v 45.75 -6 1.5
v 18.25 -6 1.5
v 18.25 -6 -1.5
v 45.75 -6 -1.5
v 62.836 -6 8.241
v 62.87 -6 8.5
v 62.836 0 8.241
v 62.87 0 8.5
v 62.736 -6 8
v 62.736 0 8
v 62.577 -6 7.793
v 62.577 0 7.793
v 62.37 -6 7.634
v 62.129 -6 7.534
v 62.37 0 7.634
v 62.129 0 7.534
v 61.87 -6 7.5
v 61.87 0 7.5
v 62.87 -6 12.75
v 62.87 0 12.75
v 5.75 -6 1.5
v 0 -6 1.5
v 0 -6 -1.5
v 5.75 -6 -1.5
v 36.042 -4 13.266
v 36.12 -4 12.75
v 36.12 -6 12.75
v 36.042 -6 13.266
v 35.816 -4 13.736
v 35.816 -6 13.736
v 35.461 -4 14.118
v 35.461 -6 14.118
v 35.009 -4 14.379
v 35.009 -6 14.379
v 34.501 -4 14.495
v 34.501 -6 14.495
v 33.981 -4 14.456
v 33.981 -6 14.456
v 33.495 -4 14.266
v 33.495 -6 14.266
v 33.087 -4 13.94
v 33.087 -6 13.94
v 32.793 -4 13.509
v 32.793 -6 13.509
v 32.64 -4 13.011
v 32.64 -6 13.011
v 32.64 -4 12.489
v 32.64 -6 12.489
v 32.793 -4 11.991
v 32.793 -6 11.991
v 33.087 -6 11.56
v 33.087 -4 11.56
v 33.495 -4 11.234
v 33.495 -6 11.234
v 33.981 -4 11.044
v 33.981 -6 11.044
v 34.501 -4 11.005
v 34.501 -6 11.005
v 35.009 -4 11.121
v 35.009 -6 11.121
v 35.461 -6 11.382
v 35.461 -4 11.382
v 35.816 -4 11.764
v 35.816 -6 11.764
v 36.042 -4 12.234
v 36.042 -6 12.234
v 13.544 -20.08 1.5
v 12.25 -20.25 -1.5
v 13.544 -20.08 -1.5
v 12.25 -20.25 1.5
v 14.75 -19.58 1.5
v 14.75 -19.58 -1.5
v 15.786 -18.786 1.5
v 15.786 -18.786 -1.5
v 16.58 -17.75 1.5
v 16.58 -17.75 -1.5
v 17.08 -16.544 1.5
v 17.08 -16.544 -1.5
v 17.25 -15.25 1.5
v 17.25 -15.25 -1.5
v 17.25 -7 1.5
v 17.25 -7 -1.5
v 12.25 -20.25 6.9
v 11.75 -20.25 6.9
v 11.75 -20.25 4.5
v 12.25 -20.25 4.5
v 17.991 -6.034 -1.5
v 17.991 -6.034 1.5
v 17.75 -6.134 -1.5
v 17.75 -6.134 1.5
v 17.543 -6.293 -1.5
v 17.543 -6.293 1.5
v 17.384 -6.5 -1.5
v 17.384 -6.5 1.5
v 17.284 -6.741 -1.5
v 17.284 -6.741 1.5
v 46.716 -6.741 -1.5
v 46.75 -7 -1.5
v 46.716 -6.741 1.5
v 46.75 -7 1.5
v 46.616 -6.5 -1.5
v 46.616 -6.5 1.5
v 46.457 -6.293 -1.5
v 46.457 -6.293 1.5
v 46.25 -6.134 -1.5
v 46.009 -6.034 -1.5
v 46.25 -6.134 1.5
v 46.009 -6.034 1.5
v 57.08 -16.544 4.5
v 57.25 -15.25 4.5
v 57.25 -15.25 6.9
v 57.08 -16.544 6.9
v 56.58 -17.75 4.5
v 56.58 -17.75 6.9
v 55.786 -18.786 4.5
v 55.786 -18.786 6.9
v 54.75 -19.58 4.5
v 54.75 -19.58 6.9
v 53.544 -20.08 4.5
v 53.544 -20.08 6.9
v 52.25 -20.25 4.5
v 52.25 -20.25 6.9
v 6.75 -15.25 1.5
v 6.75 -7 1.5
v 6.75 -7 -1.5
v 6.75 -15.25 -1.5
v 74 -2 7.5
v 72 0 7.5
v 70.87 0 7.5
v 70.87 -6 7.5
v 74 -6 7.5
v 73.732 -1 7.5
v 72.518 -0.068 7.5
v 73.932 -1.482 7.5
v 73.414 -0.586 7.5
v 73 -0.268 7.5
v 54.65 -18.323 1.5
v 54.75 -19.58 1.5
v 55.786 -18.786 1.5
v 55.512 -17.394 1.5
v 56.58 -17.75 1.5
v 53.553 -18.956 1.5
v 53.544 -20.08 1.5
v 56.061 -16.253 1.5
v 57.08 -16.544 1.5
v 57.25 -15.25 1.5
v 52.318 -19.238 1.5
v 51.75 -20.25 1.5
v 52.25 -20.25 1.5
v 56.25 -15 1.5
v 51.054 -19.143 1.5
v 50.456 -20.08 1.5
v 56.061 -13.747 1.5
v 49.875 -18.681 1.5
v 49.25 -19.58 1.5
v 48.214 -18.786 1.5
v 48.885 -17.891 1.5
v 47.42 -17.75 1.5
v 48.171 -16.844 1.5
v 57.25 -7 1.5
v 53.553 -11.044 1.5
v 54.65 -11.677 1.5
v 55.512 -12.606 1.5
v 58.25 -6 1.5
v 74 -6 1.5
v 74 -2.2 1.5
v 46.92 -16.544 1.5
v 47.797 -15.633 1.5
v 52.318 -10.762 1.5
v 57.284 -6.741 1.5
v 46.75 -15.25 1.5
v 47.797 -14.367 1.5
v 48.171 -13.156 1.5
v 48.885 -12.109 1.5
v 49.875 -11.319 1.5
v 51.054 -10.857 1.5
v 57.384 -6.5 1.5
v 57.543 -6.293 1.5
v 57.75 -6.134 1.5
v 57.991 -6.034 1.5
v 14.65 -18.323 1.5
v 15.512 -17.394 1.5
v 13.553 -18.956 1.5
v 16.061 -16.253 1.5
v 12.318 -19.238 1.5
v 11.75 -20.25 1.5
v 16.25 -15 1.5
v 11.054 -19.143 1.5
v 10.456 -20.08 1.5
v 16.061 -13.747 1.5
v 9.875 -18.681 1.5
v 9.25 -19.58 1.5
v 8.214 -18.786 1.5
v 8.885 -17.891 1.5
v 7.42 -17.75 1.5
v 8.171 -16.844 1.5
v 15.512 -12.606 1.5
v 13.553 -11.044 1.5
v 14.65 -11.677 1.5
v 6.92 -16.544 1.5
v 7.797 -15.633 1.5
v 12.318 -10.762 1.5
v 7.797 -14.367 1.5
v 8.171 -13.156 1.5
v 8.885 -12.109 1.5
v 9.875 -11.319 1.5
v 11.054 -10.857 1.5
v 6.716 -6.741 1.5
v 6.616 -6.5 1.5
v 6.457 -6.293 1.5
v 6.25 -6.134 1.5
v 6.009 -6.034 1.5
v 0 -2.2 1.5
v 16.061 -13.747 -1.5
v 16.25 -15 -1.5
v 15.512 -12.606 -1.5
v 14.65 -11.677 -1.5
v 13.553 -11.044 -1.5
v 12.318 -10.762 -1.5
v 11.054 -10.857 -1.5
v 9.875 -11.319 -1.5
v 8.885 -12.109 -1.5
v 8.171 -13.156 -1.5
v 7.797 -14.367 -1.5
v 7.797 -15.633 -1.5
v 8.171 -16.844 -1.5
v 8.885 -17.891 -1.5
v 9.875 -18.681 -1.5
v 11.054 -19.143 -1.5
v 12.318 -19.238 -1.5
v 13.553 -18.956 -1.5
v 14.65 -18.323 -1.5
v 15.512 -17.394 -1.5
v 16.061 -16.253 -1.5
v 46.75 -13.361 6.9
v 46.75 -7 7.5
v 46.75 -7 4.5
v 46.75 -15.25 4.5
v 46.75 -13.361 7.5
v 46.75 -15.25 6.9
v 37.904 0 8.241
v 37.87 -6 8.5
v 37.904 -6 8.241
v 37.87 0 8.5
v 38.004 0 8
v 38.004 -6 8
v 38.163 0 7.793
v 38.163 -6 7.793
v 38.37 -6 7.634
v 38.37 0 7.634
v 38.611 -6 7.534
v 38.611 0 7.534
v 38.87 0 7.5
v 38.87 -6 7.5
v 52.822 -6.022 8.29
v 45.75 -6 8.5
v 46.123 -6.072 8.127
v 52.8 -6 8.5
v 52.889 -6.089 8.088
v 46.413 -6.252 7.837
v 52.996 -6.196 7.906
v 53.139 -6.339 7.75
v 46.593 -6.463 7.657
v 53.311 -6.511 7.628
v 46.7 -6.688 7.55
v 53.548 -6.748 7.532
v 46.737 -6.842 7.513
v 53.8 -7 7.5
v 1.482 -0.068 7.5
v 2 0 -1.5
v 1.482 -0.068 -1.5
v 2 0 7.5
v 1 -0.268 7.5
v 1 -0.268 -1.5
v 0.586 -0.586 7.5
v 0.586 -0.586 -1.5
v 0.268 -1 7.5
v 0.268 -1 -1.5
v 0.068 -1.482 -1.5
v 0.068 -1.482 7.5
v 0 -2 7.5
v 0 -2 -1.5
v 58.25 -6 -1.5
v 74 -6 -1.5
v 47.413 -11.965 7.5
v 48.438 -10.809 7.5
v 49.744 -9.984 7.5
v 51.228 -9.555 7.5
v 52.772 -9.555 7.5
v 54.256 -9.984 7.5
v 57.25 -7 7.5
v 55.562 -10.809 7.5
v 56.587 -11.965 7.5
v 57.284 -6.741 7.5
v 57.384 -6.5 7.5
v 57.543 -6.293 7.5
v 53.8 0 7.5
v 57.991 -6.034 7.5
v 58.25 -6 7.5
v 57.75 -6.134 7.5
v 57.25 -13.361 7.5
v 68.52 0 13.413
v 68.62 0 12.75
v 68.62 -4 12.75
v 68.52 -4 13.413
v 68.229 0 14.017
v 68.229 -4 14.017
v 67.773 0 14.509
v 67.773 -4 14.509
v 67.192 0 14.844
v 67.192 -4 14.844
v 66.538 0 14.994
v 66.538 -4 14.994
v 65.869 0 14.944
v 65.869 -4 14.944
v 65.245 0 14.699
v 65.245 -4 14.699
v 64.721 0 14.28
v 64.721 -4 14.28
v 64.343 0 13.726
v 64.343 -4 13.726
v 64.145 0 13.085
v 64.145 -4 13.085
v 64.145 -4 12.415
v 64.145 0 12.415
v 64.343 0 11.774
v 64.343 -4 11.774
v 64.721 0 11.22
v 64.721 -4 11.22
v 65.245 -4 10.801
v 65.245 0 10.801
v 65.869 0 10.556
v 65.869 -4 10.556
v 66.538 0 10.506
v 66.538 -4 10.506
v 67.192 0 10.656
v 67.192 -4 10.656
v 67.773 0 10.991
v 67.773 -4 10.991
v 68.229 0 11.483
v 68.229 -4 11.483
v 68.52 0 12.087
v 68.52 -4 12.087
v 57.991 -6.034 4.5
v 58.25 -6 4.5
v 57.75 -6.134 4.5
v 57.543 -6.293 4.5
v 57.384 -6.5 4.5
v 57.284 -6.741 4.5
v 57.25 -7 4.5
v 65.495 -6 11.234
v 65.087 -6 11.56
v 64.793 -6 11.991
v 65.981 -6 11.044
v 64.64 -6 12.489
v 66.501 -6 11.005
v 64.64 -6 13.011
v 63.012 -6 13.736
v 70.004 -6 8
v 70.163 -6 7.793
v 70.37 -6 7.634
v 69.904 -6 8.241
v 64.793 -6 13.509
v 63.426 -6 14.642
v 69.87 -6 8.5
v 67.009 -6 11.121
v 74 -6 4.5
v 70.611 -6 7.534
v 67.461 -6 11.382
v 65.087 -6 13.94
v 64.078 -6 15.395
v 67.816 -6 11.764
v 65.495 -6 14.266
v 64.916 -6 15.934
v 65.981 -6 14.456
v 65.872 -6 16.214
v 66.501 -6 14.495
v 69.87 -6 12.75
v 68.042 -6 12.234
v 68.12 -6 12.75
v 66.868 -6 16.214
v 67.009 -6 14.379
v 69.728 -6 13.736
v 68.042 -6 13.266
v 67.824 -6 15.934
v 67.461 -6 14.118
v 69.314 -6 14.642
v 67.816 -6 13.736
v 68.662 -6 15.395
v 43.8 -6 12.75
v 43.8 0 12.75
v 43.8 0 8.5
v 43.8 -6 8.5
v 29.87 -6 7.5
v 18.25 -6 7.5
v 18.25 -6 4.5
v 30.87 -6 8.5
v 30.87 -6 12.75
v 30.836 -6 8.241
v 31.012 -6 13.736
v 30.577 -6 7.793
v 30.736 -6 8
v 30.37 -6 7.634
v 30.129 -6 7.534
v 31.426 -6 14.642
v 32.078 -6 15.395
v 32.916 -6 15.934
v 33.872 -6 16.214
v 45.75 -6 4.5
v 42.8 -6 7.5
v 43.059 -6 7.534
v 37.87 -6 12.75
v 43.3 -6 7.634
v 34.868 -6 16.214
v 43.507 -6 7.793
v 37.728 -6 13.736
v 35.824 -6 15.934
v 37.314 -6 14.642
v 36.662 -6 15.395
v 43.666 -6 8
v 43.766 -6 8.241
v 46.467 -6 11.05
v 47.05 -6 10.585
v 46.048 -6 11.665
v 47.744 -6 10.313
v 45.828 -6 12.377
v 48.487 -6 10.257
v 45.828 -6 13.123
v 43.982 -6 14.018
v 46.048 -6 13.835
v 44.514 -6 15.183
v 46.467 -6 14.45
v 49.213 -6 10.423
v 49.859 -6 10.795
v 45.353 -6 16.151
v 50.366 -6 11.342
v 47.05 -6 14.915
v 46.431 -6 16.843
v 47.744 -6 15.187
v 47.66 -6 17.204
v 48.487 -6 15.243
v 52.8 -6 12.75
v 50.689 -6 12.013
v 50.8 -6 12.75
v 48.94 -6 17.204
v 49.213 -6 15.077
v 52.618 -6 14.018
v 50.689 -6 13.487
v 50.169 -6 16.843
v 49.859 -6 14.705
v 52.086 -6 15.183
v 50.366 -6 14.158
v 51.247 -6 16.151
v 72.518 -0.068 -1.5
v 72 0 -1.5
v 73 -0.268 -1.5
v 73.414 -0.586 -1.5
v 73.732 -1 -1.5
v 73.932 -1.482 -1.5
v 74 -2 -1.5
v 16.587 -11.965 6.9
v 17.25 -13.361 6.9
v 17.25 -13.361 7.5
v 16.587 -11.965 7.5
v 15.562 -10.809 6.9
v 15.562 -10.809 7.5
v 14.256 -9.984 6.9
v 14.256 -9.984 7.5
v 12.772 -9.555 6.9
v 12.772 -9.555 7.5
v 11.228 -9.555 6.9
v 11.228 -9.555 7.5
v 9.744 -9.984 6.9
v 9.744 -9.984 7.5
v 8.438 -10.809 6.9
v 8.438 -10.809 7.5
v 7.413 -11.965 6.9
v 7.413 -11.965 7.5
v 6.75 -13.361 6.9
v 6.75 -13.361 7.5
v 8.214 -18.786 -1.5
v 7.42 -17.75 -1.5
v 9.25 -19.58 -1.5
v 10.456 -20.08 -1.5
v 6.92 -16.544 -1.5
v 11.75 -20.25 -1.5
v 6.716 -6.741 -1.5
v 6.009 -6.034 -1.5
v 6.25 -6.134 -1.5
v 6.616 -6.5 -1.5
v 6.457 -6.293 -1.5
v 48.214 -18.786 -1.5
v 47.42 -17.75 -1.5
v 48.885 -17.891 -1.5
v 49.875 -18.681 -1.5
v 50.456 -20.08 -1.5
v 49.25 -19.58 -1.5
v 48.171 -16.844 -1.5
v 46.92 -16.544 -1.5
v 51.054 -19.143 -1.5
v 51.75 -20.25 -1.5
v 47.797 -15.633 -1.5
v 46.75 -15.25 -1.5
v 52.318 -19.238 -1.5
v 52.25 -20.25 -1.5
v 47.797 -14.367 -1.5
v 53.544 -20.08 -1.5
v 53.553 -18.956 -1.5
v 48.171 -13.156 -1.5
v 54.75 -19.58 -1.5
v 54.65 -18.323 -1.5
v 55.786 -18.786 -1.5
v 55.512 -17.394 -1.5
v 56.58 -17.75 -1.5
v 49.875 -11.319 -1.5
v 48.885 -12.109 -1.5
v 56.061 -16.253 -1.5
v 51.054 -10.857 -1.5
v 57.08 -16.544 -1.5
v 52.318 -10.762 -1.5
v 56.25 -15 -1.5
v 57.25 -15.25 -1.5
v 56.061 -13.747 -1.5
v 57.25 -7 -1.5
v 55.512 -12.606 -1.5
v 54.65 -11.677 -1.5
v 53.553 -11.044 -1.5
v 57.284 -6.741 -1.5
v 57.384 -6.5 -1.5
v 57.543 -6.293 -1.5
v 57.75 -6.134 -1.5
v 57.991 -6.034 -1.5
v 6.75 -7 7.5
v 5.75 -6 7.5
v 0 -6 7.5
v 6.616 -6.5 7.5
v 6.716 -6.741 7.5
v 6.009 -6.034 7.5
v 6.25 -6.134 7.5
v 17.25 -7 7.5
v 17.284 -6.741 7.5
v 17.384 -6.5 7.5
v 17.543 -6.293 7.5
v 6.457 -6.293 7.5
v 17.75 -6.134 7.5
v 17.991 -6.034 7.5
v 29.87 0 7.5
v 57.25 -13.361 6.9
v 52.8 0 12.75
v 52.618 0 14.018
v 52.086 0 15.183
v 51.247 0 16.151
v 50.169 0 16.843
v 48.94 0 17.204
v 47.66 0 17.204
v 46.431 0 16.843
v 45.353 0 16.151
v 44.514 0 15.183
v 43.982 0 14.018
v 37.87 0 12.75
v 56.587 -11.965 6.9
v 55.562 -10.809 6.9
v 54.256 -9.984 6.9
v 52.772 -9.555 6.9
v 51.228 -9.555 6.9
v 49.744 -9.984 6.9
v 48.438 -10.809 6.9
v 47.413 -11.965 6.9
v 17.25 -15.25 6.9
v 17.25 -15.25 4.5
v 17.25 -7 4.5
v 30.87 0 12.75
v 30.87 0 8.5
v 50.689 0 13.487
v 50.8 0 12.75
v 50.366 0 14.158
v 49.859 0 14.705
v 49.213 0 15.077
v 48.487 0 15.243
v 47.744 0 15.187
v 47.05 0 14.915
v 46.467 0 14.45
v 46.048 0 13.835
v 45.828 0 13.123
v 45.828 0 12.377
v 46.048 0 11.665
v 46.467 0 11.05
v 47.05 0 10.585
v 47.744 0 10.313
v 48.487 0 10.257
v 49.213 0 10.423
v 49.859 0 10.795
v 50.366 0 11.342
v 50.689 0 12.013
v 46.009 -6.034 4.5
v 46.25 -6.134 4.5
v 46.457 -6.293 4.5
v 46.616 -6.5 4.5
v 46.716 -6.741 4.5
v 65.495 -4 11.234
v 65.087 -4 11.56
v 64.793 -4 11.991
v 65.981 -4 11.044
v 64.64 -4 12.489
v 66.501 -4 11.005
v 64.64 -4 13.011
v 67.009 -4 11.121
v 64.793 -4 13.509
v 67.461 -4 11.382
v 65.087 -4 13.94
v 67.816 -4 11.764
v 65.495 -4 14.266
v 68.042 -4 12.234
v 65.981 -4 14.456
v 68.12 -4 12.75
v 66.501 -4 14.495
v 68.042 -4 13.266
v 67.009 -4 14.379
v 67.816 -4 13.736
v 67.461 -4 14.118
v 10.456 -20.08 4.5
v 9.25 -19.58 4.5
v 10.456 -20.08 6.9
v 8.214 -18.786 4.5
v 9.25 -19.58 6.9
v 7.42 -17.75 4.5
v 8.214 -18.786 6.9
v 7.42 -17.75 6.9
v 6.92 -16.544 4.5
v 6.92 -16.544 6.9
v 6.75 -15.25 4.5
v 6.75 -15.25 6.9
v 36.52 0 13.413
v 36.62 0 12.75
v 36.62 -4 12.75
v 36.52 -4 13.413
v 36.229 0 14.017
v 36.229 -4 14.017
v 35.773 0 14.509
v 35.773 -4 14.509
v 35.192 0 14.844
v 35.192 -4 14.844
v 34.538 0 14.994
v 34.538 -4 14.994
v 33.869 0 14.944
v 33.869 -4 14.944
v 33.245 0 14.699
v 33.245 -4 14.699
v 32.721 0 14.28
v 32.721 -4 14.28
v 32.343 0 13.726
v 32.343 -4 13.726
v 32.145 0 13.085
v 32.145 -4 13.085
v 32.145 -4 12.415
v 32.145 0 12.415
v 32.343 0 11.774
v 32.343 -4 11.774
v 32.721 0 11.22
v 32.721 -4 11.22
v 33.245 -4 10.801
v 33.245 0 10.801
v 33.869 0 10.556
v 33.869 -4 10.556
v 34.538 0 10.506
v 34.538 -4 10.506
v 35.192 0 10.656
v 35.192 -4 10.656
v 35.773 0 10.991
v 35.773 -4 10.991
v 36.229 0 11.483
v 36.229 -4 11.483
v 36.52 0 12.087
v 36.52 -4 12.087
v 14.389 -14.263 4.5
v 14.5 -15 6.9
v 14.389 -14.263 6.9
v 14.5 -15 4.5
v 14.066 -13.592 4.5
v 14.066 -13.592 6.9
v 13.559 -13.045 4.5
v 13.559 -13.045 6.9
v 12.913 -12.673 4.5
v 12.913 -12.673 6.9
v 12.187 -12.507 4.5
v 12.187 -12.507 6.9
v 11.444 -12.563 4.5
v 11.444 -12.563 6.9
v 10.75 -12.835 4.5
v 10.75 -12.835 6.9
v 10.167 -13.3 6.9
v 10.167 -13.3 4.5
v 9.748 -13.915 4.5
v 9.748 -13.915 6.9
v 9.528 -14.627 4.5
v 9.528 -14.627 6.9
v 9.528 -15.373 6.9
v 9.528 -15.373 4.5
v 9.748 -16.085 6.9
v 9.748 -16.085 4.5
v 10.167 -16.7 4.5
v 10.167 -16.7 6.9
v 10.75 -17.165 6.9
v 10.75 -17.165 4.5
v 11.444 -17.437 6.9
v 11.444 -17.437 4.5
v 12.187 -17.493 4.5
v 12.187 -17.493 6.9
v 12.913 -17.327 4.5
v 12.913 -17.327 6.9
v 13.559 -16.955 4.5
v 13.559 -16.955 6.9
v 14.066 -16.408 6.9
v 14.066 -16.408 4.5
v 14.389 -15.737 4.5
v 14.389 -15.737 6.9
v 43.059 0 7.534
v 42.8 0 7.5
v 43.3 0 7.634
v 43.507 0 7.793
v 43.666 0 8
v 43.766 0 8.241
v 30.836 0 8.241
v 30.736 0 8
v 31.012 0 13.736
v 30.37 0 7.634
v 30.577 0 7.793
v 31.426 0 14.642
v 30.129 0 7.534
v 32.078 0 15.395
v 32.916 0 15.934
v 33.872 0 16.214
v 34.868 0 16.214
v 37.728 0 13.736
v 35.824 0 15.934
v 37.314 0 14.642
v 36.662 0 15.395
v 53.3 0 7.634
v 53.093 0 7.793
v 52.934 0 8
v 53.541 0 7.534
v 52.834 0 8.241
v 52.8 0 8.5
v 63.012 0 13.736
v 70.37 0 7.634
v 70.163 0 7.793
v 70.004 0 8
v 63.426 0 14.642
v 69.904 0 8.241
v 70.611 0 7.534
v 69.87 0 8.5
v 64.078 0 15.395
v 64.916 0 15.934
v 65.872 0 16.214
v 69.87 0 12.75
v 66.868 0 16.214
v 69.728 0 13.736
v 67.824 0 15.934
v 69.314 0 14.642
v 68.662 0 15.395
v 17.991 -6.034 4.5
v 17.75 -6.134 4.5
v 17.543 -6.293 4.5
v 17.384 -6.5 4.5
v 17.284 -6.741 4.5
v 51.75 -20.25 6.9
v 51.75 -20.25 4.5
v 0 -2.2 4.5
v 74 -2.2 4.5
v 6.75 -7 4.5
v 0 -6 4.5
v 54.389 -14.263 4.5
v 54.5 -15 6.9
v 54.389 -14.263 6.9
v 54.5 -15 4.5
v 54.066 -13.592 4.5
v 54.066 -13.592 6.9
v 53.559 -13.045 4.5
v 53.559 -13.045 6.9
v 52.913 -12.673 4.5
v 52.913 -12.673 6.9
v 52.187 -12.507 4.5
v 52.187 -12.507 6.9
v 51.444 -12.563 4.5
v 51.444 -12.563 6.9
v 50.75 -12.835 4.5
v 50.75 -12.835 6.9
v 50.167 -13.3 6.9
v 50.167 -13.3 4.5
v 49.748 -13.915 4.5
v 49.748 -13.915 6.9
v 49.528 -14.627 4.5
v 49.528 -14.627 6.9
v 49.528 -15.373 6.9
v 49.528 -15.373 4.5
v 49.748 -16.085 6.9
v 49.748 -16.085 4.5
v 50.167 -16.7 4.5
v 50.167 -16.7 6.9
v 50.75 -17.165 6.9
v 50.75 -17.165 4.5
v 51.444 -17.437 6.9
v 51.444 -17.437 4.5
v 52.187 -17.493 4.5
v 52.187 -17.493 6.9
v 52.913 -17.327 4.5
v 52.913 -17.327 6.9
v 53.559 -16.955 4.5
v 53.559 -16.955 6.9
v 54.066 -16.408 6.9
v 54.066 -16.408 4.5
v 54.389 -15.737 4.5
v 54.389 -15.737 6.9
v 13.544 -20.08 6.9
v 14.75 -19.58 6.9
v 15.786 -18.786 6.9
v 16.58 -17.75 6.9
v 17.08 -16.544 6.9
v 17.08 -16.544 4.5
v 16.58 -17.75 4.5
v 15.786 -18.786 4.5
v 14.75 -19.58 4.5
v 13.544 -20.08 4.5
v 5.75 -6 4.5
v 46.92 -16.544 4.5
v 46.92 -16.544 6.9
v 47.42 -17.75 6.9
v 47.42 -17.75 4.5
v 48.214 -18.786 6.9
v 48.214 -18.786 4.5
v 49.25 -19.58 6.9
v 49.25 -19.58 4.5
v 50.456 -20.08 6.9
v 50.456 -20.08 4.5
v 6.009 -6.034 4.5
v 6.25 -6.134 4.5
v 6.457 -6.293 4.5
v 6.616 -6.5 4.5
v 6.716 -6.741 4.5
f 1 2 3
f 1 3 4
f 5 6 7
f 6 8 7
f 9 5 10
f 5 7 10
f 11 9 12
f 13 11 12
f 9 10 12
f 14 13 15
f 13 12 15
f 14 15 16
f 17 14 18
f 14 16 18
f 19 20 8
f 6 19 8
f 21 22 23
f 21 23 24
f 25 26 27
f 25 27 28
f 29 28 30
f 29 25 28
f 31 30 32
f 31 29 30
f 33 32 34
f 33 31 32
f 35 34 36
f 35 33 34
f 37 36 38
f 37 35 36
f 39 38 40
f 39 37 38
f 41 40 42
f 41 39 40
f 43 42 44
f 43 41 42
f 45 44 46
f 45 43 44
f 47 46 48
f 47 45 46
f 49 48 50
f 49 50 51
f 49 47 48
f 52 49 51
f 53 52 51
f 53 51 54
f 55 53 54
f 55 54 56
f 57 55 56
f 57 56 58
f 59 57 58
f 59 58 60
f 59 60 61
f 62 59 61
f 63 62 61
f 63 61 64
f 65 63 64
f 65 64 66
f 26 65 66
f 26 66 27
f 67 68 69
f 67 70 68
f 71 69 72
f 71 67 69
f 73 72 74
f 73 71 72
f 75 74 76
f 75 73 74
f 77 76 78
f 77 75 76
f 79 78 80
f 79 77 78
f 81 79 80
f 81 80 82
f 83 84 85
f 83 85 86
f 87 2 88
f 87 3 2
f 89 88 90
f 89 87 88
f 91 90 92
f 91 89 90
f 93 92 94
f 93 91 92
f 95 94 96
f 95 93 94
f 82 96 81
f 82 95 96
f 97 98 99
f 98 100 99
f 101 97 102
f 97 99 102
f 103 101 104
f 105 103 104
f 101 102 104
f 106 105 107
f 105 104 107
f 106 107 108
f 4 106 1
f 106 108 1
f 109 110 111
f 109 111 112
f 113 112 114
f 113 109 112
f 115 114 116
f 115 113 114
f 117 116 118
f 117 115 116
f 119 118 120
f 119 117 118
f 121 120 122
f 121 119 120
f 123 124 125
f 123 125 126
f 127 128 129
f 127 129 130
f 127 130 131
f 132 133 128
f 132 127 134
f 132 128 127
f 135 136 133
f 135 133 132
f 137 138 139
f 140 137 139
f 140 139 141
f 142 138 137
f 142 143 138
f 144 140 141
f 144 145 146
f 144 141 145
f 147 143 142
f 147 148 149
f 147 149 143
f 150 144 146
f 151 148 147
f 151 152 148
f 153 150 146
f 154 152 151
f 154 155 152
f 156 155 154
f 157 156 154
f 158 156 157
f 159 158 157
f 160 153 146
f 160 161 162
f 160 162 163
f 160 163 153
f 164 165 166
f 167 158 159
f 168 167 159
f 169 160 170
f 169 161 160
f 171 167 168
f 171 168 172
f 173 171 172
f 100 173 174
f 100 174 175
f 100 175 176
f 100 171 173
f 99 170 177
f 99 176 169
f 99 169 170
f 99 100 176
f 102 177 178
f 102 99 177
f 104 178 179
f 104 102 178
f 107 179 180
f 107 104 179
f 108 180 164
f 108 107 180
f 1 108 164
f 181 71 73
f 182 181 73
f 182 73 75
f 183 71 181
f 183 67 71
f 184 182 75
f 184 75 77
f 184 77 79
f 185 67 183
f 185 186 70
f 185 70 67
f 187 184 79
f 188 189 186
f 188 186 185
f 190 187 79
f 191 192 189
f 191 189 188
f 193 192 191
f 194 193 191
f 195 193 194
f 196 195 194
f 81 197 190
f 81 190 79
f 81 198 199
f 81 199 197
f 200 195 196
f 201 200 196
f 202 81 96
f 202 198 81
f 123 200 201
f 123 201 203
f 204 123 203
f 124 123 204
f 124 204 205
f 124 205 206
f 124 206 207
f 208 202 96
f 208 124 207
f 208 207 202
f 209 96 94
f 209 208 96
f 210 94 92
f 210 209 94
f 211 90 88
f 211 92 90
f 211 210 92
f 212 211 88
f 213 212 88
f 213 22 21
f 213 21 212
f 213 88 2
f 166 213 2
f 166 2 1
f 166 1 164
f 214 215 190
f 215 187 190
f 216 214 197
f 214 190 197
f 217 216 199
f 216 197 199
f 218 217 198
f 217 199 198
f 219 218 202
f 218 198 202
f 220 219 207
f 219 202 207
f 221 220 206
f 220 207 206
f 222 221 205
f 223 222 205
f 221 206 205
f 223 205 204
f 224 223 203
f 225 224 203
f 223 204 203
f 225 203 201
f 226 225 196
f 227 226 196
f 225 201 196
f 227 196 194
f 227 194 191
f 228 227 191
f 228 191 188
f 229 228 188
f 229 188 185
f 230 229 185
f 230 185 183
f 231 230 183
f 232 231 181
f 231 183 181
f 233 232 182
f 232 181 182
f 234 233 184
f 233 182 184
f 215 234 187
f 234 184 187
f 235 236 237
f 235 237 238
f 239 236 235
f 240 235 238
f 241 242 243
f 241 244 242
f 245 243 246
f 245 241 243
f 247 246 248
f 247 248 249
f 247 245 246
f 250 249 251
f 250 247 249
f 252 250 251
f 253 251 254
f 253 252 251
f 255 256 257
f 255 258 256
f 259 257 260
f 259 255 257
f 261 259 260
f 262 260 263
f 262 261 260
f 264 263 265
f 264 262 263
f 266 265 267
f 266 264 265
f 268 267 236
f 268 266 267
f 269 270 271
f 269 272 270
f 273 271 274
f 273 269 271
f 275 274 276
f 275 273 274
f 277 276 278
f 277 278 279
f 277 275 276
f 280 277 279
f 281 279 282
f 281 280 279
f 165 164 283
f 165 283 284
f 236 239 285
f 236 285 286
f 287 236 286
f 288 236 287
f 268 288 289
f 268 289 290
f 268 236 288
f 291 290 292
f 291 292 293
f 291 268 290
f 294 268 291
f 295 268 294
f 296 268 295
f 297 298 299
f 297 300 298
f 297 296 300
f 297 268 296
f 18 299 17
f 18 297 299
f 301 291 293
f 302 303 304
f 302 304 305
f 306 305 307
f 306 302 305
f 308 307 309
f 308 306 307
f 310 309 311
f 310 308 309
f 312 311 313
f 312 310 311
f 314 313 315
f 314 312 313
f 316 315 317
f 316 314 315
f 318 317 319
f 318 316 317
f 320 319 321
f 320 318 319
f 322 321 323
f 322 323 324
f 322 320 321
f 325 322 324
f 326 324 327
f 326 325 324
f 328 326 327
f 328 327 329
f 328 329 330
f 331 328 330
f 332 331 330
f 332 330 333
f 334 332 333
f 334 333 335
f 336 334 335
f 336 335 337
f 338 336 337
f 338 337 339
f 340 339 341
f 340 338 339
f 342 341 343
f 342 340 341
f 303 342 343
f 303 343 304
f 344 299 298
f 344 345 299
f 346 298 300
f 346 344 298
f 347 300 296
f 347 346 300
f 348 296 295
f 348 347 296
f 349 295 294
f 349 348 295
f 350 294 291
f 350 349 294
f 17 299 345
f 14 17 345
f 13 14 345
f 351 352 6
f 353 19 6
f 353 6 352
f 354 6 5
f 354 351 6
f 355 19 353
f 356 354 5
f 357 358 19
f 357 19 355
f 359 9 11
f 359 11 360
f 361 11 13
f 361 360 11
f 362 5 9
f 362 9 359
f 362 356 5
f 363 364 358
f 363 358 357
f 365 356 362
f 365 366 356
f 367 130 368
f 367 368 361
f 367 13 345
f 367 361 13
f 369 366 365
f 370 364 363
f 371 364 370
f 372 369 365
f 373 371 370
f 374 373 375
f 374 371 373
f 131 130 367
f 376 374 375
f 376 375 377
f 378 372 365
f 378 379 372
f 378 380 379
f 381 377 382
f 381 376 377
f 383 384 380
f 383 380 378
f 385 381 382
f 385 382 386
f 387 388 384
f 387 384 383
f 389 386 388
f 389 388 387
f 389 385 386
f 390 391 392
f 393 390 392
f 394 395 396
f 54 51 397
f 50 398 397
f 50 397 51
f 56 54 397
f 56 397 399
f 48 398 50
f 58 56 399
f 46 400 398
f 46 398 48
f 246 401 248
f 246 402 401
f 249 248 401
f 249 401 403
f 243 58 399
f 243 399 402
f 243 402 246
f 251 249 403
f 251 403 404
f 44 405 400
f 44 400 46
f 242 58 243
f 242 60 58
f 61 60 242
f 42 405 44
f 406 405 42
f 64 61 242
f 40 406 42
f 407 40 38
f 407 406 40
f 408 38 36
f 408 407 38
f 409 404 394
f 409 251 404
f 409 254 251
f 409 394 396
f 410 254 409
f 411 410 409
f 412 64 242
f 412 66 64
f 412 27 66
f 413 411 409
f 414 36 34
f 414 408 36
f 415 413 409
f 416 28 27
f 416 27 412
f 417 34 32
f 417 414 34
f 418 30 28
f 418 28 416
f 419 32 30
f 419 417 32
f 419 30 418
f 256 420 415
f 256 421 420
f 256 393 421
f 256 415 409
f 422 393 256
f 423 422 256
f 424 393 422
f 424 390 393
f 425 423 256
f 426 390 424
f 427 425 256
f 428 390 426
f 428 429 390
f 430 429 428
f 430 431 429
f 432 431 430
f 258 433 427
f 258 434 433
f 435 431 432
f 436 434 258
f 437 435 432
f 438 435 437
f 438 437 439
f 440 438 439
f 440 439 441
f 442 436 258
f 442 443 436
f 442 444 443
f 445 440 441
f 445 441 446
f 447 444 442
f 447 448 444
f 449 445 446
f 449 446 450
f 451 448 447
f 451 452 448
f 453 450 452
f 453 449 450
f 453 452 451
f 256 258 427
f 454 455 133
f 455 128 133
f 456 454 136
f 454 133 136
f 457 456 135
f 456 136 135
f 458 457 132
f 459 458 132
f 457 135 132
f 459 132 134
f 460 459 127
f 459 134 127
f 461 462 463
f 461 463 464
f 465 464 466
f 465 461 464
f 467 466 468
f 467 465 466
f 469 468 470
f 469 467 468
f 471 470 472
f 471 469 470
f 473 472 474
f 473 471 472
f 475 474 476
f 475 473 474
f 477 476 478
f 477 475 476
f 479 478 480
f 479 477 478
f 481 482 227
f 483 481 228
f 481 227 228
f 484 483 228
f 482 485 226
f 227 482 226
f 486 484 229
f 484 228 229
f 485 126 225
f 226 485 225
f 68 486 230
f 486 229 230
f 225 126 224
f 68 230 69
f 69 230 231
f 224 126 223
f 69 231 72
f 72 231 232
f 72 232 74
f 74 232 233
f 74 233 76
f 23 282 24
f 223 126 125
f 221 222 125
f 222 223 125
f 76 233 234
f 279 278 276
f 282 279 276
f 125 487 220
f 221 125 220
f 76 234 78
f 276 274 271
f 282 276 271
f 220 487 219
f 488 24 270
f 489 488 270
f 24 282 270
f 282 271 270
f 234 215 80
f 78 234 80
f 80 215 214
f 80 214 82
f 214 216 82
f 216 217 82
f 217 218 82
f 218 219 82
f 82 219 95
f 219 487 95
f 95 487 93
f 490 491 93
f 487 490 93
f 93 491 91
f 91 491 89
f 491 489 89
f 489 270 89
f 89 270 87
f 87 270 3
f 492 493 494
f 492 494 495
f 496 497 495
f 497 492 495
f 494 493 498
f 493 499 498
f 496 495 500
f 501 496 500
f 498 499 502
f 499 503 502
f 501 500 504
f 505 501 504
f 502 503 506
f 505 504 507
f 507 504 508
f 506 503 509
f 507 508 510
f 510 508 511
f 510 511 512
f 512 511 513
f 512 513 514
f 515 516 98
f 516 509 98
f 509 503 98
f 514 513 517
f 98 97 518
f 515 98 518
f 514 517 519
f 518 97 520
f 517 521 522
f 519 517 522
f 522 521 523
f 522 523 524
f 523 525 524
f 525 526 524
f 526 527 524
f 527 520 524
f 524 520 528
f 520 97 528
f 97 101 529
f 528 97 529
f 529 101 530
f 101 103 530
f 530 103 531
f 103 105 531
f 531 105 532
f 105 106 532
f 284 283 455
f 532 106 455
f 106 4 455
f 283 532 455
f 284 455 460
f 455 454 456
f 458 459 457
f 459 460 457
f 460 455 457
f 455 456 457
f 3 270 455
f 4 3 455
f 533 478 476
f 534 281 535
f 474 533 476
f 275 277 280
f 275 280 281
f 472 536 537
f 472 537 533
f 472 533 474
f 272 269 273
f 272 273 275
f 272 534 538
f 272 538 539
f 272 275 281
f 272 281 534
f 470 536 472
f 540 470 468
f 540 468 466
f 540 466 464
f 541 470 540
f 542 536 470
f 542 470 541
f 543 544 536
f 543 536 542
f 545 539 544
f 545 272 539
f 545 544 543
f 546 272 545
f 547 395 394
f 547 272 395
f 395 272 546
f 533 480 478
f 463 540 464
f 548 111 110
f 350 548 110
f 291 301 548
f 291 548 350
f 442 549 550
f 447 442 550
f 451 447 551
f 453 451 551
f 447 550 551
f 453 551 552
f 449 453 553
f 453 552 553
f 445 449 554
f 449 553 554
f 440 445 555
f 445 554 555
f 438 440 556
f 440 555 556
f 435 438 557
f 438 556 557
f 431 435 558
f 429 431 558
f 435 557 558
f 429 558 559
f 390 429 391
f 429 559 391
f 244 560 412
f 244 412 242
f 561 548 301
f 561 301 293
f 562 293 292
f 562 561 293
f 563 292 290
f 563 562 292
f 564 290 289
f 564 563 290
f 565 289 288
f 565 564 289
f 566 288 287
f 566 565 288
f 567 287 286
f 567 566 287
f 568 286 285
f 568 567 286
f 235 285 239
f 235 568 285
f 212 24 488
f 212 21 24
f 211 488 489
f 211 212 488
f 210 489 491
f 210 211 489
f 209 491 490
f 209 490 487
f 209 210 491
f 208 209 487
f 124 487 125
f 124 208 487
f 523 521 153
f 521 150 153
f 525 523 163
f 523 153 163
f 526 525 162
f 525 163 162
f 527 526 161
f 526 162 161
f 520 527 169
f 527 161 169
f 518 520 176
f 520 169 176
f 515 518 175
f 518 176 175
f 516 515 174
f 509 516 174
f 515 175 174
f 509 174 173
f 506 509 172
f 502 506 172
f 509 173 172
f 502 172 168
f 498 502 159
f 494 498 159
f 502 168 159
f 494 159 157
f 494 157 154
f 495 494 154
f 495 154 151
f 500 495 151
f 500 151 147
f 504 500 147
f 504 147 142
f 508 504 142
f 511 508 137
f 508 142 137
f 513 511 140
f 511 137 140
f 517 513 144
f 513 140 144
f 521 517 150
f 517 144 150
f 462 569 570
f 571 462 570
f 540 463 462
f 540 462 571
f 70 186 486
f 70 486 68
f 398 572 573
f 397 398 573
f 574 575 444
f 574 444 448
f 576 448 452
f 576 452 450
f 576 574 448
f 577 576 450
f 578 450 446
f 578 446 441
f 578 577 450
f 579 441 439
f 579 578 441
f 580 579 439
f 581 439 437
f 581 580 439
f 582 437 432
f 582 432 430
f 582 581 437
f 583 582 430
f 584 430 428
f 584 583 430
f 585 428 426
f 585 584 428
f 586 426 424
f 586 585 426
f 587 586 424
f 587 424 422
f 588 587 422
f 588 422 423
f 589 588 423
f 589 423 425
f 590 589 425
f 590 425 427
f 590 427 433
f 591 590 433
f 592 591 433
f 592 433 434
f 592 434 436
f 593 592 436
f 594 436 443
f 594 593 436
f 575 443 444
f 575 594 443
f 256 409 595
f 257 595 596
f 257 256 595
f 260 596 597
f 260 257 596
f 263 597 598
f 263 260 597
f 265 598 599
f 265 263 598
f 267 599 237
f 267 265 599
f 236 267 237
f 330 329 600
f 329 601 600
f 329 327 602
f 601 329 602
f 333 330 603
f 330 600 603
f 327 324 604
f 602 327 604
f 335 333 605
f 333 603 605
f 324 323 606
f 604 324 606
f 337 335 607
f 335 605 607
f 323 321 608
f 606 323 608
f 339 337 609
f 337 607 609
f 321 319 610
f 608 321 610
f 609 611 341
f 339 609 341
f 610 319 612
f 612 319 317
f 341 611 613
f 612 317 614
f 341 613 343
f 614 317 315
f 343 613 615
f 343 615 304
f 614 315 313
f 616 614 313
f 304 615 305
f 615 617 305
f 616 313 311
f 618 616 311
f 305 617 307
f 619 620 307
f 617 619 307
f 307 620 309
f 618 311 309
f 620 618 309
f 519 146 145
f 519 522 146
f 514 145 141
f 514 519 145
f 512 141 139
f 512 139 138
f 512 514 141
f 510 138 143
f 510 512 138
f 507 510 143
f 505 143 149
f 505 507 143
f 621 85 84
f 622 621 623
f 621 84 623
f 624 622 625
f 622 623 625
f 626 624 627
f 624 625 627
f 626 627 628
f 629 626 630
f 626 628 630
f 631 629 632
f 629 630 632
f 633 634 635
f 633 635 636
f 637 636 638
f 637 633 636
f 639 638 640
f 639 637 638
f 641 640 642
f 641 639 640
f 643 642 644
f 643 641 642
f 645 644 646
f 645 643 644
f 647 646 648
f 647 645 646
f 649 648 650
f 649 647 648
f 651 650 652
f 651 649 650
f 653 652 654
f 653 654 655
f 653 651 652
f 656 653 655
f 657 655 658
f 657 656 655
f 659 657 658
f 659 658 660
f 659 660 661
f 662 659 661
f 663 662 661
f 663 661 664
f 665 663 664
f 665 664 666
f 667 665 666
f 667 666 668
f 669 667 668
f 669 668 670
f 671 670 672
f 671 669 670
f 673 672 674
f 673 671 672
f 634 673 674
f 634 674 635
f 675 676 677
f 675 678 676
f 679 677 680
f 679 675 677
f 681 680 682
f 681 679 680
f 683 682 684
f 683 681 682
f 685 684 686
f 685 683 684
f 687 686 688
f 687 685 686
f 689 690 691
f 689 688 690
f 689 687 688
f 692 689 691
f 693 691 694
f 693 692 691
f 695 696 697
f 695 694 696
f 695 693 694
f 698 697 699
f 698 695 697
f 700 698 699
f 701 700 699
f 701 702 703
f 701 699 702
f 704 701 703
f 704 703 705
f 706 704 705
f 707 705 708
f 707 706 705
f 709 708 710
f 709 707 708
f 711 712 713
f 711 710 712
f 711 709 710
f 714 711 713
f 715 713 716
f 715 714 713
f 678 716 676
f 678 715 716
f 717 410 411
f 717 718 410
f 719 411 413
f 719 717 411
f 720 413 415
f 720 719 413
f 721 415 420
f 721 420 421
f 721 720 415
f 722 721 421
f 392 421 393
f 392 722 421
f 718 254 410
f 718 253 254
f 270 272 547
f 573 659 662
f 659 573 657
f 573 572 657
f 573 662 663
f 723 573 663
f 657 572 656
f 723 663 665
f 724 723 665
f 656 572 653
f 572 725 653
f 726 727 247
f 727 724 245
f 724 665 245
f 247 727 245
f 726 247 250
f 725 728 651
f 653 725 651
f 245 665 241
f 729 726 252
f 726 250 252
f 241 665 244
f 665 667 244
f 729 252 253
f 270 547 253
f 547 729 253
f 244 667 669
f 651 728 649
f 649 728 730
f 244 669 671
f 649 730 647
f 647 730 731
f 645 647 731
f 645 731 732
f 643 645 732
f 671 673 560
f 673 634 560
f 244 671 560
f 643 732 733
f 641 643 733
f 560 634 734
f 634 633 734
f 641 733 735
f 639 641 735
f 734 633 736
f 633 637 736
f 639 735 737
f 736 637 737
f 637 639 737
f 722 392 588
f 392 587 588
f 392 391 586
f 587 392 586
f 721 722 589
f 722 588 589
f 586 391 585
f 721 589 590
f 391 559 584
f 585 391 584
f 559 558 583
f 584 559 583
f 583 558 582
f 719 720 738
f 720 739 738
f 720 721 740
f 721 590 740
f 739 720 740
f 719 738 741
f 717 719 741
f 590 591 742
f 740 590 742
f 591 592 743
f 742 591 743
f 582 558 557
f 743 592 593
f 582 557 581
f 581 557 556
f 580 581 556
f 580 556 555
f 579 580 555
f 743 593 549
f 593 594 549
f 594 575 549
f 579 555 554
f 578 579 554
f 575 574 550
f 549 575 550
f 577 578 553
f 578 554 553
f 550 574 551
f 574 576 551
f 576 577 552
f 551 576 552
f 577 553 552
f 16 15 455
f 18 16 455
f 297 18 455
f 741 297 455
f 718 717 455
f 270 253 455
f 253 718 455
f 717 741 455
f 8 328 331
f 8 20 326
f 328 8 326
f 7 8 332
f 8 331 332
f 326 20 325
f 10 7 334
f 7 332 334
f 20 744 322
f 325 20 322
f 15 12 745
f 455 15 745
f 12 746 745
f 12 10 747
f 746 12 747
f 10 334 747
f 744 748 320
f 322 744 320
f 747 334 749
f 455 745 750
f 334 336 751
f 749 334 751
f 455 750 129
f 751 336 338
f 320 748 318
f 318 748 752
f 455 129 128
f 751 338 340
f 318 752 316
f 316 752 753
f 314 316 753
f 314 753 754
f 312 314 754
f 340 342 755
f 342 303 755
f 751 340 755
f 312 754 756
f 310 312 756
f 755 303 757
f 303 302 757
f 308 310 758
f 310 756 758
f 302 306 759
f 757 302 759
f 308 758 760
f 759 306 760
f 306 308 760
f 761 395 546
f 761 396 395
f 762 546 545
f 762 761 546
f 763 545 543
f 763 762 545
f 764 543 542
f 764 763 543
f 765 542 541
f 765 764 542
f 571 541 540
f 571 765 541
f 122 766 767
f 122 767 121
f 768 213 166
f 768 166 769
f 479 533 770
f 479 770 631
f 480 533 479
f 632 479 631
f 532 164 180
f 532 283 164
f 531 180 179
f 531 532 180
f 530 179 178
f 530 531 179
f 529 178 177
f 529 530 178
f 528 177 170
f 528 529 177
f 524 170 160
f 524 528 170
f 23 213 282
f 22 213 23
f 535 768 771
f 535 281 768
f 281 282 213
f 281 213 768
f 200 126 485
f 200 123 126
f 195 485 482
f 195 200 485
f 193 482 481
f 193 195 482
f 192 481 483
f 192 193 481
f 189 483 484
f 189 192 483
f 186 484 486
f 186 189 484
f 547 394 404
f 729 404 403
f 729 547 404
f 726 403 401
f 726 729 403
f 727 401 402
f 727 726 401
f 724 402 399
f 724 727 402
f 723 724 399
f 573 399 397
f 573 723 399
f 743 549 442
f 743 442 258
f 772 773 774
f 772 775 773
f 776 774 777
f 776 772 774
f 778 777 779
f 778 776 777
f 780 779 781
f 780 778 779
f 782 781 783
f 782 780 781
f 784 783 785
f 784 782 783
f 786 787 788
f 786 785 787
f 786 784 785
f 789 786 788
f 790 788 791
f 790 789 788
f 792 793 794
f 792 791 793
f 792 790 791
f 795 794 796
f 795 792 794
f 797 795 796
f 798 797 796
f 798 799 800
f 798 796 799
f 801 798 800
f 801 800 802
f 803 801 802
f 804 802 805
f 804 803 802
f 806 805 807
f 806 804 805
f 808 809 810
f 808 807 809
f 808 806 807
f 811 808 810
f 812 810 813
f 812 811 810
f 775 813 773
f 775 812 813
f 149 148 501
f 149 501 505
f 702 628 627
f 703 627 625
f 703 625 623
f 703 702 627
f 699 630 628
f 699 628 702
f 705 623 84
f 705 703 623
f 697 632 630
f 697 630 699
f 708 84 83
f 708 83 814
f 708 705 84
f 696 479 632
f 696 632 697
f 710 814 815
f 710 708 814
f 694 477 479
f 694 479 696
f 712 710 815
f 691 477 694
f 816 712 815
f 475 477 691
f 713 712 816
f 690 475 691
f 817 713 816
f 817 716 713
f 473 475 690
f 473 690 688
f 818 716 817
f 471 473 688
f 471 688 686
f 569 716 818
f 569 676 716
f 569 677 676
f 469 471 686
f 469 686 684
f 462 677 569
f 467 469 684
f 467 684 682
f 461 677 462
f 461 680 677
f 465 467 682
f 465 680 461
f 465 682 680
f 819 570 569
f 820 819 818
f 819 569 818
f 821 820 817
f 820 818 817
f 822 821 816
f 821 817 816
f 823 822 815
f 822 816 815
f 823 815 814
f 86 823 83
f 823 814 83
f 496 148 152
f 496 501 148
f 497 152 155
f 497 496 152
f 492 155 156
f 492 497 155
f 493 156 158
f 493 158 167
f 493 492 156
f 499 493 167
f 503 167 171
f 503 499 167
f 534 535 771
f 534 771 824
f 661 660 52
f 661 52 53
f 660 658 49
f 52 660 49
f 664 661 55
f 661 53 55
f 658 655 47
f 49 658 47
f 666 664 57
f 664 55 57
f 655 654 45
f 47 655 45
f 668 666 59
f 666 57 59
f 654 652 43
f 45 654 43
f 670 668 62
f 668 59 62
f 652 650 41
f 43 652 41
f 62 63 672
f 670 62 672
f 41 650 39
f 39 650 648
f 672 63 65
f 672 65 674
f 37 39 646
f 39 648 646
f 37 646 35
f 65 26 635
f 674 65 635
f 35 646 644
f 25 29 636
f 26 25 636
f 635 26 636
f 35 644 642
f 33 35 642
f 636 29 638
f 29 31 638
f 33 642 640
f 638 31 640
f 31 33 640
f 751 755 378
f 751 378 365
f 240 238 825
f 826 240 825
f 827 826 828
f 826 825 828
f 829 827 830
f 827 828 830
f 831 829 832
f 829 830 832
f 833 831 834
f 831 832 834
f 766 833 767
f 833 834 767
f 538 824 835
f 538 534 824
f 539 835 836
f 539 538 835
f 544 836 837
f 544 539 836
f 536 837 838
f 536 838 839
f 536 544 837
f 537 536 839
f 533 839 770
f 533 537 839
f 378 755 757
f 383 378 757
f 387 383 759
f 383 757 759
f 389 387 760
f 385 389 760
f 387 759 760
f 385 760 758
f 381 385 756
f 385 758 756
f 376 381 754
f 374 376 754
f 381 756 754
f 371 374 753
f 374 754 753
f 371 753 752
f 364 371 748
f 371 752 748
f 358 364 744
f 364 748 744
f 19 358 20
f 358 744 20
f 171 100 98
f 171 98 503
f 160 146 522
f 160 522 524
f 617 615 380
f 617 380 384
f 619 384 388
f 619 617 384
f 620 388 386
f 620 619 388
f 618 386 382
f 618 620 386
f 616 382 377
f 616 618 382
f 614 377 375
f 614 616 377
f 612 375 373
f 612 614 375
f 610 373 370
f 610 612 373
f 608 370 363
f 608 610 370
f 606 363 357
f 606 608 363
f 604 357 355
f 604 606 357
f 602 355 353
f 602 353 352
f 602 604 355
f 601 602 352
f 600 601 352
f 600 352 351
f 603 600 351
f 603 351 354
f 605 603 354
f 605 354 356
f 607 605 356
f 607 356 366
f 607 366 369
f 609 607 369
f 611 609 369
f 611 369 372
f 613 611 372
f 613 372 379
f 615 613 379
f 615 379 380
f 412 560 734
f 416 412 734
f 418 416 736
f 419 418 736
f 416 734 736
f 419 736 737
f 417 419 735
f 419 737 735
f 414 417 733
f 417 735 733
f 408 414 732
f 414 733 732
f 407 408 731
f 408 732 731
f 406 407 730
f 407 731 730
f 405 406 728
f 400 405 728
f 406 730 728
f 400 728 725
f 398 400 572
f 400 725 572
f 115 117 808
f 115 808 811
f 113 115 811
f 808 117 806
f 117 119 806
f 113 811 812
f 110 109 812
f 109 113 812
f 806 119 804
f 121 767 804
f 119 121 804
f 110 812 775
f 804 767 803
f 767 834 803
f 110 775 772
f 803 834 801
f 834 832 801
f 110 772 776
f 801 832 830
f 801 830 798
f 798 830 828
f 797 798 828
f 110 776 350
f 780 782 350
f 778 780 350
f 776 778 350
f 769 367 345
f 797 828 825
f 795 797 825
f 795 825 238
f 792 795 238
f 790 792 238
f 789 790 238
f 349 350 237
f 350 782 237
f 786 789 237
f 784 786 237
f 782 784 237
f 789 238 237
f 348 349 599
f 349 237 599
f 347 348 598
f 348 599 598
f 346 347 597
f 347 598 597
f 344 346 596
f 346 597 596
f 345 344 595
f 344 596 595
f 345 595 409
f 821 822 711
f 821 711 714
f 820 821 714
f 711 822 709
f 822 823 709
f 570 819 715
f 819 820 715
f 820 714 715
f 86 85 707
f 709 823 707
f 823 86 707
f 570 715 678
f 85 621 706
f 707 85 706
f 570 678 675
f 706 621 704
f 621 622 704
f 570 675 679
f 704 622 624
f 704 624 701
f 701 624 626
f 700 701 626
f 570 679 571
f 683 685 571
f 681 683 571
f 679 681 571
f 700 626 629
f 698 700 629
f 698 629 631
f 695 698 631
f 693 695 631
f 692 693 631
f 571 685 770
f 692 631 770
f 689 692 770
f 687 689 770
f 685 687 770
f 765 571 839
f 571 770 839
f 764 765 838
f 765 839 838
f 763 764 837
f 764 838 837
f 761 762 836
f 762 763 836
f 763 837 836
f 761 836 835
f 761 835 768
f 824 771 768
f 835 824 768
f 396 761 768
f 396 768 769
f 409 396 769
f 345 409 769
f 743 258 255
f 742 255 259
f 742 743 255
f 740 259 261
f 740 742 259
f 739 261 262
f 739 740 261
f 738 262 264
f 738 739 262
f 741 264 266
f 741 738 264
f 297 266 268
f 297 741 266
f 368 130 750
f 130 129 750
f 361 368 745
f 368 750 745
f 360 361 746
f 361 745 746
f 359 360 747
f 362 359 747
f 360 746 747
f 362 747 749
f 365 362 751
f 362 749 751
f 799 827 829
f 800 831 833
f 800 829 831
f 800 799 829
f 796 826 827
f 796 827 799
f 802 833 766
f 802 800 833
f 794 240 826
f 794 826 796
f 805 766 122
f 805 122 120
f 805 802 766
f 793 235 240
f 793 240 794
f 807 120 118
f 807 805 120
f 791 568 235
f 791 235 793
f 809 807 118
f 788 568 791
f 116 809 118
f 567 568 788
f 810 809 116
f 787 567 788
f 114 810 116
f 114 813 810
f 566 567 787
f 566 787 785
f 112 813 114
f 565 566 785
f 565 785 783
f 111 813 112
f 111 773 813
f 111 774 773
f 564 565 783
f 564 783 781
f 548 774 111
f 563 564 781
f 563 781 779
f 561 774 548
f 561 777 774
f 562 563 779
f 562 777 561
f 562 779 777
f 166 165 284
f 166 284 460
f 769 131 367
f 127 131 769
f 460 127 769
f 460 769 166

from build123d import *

# Parameters (mm, degrees)
SKETCH001_R          = 2.5
PAD_DEPTH            = 7.5
PAD_DEPTH_BACK       = 1.5
SKETCH_R             = 1.75
SKETCH_R_2           = 2.5
PAD001_DEPTH         = 6
SKETCH003_W          = 20
SKETCH003_H          = 3
POCKET_DEPTH         = 100
POCKET_DEPTH_BACK    = -100
FILLET_R             = 5
FILLET001_R          = 2
FILLET002_R          = 1
SKETCH004_R          = 4.25
POCKET001_DEPTH      = 2
POCKET001_DEPTH_BACK = -2
SKETCH005_R          = 5.5
POCKET002_DEPTH      = 5
SKETCH006_R          = 2.25
POCKET003_DEPTH      = 4


with BuildPart() as part:
    # Sketch001 → Pad (new body, two sides)
    with BuildSketch(Plane.XY) as pad_sk:
        Polygon((74, -6), (74, 0), (0, 0), (0, -6), (6.75, -6), (6.75, -20.25), (17.25, -20.25), (17.25, -6), (46.75, -6), (46.75, -20.25), (57.25, -20.25), (57.25, -6), align=None)
        with Locations((12, -15)):
            Circle(SKETCH001_R, mode=Mode.SUBTRACT)
        with Locations((52, -15)):
            Circle(SKETCH001_R, mode=Mode.SUBTRACT)
    extrude(amount=PAD_DEPTH)
    extrude(pad_sk.sketch, amount=-PAD_DEPTH_BACK)

    # Sketch → Pad001 (join)
    with BuildSketch(Plane.XZ):
        with BuildLine():
            ThreePointArc((37.87, 12.75), (34.37, 16.25), (30.87, 12.75))
            Line((30.87, 12.75), (30.87, 4.75))
            ThreePointArc((30.87, 4.75), (34.37, 1.25), (37.87, 4.75))
            Line((37.87, 12.75), (37.87, 4.75))
        make_face()
        with Locations((34.37, 12.75)):
            Circle(SKETCH_R, mode=Mode.SUBTRACT)
        with BuildLine():
            ThreePointArc((52.8, 12.75), (48.3, 17.25), (43.8, 12.75))
            Line((43.8, 12.75), (43.8, 4.75))
            ThreePointArc((43.8, 4.75), (48.3, 0.25), (52.8, 4.75))
            Line((52.8, 12.75), (52.8, 4.75))
        make_face()
        with Locations((48.3, 12.75)):
            Circle(SKETCH_R_2, mode=Mode.SUBTRACT)
        with BuildLine():
            ThreePointArc((69.87, 12.75), (66.37, 16.25), (62.87, 12.75))
            Line((62.87, 12.75), (62.87, 4.75))
            ThreePointArc((62.87, 4.75), (66.37, 1.25), (69.87, 4.75))
            Line((69.87, 12.75), (69.87, 4.75))
        make_face()
        with Locations((66.37, 12.75)):
            Circle(SKETCH_R, mode=Mode.SUBTRACT)
    extrude(amount=PAD001_DEPTH)

    # Sketch003 → Pocket (cut, two sides)
    with BuildSketch(Plane.YZ) as pocket_sk:
        with Locations((-12.2, 3)):
            Rectangle(SKETCH003_W, SKETCH003_H)
    extrude(amount=-POCKET_DEPTH, mode=Mode.SUBTRACT)
    extrude(pocket_sk.sketch, amount=-POCKET_DEPTH_BACK, mode=Mode.SUBTRACT)

    # Fillet
    fillet_edges = [part.edges().sort_by_distance(p)[0] for p in [
        (46.75, -20.25, 0),
        (46.75, -20.25, 6),
        (57.25, -20.25, 6),
        (57.25, -20.25, 0),
        (17.25, -20.25, 0),
        (17.25, -20.25, 6),
        (6.75, -20.25, 6),
        (6.75, -20.25, 0),
    ]]
    fillet(fillet_edges, radius=FILLET_R)

    # Fillet001
    fillet001_edges = [part.edges().sort_by_distance(p)[0] for p in [
        (74, 0, 3),
        (0, 0, 3),
    ]]
    fillet(fillet001_edges, radius=FILLET001_R)

    # Fillet002
    fillet002_edges = [part.edges().sort_by_distance(p)[0] for p in [
        (49.775, -6, 7.5),
        (52.8, -3, 7.5),
        (46.75, -6, 6),
        (57.25, -6, 6),
        (62.87, -3, 7.5),
        (69.87, -3, 7.5),
        (57.25, -6, 0),
        (46.75, -6, 0),
        (6.75, -6, 6),
        (6.75, -6, 0),
        (43.8, -3, 7.5),
        (30.87, -3, 7.5),
        (37.87, -3, 7.5),
        (17.25, -6, 6),
        (17.25, -6, 0),
    ]]
    fillet(fillet002_edges, radius=FILLET002_R)

    # Sketch004 → Pocket001 (cut, two sides)
    with BuildSketch(Plane.XY) as pocket001_sk:
        with Locations((12, -15)):
            Circle(SKETCH004_R)
        with Locations((52, -15)):
            Circle(SKETCH004_R)
    extrude(amount=-POCKET001_DEPTH, mode=Mode.SUBTRACT)
    extrude(pocket001_sk.sketch, amount=-POCKET001_DEPTH_BACK, mode=Mode.SUBTRACT)

    # Sketch005 → Pocket002 (cut)
    with BuildSketch(Plane.XY.offset(6.9)):
        with Locations((12, -15)):
            Circle(SKETCH005_R)
        with Locations((52, -15)):
            Circle(SKETCH005_R)
    extrude(amount=POCKET002_DEPTH, mode=Mode.SUBTRACT)

    # Sketch006 → Pocket003 (cut)
    with BuildSketch(Plane.XZ):
        with Locations((34.37, 12.75)):
            Circle(SKETCH006_R)
        with Locations((66.37, 12.75)):
            Circle(SKETCH006_R)
    extrude(amount=POCKET003_DEPTH, mode=Mode.SUBTRACT)


solid = part.part
